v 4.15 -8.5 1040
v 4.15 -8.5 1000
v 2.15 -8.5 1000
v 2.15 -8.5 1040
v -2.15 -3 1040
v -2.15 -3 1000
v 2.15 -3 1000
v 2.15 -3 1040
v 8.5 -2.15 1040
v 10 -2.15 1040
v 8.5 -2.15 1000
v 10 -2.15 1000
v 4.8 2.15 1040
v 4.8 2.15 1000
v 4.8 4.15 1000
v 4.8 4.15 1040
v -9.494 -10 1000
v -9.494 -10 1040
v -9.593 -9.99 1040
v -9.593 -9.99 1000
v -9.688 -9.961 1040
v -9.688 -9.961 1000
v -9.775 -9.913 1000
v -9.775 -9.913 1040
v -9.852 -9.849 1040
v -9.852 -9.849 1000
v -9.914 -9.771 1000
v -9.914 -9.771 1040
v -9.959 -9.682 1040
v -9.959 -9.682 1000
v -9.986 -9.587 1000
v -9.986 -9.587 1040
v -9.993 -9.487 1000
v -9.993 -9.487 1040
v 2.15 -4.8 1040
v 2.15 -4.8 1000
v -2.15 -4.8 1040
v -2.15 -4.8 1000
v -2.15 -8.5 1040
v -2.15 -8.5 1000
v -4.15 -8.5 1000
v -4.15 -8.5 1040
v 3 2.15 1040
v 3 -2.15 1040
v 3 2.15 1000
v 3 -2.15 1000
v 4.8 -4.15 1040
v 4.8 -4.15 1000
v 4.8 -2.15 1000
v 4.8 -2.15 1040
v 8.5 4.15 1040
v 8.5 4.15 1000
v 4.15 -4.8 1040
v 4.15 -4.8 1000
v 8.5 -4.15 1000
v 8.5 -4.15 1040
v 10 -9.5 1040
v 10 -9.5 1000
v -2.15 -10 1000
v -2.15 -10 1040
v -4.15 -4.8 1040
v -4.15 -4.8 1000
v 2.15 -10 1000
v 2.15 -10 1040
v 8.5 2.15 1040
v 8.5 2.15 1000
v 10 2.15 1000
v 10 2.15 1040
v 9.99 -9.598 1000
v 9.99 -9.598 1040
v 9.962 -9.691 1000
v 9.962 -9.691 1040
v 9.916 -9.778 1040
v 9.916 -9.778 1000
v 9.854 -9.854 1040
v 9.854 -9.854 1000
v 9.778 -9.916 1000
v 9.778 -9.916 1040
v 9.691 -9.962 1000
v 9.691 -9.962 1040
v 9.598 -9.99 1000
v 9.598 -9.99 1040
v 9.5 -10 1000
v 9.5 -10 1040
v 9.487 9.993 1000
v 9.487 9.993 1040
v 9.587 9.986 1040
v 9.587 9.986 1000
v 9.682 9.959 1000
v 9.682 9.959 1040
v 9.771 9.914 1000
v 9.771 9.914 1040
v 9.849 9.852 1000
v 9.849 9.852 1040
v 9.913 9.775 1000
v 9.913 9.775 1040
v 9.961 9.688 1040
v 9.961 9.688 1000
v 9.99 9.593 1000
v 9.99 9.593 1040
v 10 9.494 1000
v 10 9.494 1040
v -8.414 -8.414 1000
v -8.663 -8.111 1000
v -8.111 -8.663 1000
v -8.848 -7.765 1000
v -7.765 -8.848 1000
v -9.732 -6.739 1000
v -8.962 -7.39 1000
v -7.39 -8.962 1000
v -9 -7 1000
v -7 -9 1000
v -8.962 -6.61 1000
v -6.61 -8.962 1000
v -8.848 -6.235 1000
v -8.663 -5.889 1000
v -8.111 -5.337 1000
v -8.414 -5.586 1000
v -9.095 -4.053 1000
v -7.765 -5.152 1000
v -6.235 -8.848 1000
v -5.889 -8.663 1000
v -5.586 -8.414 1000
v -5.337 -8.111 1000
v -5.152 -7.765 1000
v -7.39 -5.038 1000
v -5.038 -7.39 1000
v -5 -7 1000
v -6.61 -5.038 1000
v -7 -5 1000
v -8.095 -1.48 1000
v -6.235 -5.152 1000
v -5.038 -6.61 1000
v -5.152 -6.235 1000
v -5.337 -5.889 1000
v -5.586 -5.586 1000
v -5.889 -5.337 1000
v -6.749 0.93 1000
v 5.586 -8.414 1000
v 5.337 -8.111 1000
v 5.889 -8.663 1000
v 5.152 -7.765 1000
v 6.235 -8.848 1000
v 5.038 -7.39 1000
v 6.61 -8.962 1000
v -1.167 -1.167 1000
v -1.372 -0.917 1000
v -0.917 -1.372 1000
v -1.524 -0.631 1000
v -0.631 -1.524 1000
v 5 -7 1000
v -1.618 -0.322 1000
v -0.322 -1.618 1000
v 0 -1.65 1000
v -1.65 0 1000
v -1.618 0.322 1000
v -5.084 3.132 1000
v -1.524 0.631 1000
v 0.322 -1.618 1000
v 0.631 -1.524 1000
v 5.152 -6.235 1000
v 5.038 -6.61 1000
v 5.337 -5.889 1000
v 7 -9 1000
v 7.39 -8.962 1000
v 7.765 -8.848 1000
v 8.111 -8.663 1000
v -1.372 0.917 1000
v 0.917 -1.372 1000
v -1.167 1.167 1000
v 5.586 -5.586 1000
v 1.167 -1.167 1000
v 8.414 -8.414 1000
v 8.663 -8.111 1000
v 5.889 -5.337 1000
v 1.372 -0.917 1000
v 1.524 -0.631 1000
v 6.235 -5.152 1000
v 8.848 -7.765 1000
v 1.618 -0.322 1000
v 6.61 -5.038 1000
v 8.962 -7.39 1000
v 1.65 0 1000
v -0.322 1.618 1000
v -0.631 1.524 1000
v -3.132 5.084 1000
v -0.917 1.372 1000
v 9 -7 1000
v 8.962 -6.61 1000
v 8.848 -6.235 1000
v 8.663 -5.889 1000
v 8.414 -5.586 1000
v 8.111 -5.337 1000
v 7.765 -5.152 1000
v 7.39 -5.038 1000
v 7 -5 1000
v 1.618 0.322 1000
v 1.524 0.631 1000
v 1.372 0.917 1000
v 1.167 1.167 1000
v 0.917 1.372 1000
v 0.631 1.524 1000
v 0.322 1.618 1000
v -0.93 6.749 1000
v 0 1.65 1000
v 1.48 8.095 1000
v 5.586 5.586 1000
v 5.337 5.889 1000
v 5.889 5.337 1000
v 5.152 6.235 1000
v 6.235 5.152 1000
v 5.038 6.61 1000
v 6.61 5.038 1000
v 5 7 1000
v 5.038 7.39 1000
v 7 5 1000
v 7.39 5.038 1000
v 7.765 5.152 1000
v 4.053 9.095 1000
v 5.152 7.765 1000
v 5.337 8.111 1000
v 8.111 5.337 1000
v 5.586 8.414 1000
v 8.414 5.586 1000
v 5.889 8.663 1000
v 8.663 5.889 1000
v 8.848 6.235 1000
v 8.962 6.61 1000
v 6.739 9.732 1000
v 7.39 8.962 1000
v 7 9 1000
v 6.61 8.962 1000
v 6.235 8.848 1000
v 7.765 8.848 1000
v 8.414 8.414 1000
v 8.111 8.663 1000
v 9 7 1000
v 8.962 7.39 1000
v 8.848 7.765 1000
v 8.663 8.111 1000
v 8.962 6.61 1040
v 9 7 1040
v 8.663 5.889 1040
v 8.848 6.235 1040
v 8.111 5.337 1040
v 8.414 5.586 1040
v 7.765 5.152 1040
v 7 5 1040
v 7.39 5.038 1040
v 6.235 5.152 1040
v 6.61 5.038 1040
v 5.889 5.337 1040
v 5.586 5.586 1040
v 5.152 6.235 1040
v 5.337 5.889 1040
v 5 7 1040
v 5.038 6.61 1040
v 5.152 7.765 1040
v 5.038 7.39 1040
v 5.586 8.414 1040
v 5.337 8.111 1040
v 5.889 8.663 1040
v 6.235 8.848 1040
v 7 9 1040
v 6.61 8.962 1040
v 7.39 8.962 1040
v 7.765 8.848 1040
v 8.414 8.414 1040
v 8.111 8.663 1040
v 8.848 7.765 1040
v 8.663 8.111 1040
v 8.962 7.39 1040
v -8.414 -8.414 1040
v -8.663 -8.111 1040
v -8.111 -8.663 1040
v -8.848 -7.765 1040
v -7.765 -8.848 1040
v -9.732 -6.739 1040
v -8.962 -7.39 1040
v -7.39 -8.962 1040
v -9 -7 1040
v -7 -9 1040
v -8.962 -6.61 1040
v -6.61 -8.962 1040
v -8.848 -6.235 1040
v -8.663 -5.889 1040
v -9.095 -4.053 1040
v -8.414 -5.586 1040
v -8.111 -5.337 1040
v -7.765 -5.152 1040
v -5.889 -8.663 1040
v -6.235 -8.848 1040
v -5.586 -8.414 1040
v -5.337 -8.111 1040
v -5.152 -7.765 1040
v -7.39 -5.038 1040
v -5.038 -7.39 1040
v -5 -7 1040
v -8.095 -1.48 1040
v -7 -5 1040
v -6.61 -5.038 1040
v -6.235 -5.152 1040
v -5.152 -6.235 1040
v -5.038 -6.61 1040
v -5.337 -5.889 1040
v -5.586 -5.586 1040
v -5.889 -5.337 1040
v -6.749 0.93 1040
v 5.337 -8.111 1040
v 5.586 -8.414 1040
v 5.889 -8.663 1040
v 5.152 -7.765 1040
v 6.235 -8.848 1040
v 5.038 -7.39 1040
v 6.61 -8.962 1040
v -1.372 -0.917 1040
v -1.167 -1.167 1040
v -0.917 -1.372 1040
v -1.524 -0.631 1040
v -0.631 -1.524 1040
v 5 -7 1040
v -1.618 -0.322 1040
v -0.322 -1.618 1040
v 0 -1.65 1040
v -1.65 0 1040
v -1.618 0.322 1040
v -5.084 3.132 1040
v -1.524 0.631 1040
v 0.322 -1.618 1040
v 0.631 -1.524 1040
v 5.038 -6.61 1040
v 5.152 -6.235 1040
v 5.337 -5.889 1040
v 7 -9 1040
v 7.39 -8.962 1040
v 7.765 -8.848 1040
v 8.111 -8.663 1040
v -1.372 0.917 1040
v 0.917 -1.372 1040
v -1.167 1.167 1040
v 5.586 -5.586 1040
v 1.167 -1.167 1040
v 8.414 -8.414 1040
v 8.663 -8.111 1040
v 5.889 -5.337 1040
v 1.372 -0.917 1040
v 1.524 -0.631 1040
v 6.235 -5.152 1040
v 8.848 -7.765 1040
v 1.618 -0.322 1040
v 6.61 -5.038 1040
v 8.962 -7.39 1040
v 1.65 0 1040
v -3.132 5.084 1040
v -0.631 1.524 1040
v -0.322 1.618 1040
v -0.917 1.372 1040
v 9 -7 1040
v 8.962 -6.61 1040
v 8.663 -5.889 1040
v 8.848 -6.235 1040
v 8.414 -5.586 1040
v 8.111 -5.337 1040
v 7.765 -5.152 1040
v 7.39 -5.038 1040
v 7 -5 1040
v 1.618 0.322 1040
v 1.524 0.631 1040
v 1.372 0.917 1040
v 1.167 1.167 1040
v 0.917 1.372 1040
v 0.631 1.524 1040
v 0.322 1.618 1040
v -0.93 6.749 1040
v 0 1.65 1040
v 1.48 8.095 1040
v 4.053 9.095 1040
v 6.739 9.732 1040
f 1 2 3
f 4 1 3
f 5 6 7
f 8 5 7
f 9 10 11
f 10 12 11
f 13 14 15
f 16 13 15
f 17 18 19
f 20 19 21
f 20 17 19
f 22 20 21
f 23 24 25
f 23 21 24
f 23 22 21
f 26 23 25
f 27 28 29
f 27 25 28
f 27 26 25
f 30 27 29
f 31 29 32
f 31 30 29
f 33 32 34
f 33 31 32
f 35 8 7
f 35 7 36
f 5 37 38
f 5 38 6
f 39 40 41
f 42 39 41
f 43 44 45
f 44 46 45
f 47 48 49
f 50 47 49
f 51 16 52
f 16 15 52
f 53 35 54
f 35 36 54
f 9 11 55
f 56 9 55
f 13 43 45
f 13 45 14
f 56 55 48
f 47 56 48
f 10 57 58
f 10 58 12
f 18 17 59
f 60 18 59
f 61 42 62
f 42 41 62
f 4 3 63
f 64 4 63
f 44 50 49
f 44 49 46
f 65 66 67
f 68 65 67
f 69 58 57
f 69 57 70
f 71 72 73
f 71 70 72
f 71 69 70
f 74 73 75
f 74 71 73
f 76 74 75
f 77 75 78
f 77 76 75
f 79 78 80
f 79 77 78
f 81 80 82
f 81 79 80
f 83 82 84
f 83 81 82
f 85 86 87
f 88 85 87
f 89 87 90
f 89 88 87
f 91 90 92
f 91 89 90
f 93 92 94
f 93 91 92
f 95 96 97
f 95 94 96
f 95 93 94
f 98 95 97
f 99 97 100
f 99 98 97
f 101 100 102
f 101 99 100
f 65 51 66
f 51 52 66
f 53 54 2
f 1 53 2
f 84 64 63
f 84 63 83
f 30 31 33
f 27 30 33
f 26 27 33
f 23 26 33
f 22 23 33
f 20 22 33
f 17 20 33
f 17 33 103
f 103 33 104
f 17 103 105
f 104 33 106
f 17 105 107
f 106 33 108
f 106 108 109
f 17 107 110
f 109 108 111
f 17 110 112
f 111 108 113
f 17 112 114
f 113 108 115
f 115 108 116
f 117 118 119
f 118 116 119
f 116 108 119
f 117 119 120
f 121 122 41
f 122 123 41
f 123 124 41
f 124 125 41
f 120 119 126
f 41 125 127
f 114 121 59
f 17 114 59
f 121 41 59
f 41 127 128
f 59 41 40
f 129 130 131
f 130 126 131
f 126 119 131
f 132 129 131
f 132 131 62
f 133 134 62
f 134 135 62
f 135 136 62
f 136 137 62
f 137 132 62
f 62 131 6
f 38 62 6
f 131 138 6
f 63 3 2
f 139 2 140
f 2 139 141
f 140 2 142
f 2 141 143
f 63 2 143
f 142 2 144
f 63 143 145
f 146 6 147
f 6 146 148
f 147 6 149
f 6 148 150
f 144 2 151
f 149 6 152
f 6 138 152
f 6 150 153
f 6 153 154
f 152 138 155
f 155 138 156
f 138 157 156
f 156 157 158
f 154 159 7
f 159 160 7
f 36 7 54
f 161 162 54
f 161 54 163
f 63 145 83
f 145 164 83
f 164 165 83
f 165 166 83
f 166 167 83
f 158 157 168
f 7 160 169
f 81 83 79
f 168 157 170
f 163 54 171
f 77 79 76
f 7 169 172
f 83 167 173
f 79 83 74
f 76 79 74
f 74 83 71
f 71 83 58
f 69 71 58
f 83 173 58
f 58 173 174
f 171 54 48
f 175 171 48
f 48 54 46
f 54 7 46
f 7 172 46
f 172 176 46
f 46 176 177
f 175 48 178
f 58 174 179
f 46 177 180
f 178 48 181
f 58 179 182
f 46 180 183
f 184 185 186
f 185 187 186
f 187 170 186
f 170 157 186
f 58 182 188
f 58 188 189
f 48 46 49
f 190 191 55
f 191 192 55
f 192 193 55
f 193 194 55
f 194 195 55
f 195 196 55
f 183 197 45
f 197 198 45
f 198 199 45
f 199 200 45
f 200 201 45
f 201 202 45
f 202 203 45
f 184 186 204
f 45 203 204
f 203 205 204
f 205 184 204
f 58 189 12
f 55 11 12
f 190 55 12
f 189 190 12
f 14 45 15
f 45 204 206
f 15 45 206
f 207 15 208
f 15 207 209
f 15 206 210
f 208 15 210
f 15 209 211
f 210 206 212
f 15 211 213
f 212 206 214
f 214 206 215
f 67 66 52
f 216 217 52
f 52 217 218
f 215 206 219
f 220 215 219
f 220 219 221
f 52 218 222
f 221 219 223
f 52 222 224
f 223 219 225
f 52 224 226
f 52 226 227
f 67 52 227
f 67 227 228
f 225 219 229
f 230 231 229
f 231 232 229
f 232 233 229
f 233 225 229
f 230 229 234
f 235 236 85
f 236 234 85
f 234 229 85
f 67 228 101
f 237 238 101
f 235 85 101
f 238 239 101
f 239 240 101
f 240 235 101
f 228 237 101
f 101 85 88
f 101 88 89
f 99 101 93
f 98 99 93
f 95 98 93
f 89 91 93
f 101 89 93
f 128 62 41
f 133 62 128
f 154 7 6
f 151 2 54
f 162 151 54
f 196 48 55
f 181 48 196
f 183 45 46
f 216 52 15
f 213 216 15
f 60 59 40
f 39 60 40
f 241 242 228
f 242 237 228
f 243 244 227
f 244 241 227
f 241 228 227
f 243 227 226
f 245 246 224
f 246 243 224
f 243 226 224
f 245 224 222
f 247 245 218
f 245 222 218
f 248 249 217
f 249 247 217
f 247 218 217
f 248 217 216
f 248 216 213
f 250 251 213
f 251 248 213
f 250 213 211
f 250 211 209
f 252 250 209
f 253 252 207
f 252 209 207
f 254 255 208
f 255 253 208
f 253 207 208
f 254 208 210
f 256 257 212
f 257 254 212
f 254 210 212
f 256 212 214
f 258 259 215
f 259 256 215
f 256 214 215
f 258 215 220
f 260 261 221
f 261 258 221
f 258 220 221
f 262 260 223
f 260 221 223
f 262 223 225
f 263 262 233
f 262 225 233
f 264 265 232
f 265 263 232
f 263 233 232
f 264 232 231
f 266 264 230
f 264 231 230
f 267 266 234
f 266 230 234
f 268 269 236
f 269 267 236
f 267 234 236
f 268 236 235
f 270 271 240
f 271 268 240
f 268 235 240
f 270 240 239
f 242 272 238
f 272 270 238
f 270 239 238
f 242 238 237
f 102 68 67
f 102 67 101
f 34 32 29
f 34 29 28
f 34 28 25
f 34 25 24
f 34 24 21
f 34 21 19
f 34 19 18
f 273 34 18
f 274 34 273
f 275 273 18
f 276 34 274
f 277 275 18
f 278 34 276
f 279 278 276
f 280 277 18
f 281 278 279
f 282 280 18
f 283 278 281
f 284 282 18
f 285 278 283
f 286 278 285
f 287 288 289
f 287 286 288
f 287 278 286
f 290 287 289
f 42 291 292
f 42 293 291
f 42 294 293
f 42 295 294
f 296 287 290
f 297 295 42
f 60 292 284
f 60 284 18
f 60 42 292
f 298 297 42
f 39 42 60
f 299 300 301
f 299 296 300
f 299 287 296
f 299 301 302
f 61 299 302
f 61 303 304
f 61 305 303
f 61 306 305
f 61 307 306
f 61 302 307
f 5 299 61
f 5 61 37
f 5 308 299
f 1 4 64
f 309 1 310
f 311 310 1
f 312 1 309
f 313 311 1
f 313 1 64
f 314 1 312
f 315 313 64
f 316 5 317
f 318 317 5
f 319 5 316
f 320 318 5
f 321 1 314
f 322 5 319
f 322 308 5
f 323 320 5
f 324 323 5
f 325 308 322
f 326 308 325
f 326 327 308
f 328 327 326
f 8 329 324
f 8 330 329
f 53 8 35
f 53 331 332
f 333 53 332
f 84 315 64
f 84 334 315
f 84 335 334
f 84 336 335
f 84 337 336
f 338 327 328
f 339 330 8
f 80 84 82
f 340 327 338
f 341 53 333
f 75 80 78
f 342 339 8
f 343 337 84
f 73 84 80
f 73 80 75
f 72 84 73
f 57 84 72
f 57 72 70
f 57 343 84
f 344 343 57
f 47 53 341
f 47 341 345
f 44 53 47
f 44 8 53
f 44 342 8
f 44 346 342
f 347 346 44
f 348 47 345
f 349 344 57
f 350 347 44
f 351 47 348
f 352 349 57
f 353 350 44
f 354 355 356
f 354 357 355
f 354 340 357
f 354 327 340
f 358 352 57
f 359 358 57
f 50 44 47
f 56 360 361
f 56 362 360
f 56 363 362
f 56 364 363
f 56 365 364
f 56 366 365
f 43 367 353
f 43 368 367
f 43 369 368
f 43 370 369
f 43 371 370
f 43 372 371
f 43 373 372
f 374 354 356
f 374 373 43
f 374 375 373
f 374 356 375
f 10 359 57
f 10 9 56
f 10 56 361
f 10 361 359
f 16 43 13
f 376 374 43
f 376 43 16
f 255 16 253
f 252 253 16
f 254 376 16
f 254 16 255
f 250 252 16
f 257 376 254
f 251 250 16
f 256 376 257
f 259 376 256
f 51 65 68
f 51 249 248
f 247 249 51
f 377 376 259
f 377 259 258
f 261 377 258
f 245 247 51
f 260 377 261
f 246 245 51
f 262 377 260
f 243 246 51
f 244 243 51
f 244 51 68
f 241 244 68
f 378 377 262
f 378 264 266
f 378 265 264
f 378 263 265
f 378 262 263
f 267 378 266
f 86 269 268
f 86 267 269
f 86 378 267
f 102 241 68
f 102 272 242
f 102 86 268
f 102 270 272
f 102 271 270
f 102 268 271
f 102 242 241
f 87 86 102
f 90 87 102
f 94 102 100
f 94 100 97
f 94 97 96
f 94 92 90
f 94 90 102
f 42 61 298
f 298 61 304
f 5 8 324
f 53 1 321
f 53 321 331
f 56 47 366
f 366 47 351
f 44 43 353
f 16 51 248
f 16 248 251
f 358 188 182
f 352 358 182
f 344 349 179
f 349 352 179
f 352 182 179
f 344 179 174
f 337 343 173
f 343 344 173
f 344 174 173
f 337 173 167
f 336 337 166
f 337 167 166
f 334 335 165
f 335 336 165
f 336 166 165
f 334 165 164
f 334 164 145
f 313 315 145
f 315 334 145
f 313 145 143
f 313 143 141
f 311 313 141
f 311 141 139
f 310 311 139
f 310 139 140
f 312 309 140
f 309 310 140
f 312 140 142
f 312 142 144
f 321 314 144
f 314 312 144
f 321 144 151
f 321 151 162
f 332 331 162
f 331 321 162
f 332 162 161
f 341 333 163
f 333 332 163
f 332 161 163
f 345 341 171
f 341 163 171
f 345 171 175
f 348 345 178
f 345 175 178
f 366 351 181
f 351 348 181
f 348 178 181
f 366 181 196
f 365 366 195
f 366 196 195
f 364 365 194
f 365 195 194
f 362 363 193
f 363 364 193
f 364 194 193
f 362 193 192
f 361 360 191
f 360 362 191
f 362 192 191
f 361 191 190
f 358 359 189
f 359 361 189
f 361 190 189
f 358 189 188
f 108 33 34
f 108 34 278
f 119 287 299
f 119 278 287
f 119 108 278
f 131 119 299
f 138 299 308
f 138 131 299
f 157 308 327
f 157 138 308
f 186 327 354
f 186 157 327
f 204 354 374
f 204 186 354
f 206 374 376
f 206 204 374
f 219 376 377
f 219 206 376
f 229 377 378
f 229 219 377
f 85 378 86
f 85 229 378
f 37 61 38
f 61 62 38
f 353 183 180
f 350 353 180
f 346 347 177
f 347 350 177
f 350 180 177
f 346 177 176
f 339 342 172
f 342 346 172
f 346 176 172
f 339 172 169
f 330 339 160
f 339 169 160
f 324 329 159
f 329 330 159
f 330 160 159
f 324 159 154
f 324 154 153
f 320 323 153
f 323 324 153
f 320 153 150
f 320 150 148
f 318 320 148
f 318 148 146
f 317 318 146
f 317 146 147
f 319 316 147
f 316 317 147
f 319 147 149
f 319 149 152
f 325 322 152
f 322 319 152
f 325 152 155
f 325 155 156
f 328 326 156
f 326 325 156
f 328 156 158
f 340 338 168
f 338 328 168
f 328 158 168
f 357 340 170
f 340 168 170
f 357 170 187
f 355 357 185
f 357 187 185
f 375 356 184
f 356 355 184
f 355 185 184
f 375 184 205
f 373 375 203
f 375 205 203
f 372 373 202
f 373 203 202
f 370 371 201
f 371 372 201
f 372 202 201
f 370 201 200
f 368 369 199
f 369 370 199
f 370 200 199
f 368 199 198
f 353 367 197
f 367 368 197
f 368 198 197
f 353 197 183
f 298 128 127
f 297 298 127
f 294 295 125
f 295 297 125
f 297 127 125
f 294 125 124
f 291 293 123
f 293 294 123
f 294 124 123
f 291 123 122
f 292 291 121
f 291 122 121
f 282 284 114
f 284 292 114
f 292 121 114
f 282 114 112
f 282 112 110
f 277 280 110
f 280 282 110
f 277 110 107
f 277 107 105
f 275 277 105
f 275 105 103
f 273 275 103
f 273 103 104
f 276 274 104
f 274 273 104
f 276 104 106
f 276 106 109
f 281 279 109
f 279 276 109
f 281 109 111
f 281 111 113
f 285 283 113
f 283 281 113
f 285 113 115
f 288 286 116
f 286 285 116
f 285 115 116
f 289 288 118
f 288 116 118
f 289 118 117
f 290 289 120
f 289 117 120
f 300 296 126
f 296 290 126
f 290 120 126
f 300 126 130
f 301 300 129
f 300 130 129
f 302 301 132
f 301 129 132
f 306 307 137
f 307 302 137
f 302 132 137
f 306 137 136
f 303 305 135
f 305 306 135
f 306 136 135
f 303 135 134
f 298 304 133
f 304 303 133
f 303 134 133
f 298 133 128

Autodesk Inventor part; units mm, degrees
ref_plane "YZ Plane" through (0, 0, 0) normal (1, 0, 0) x (0, 1, 0)
ref_plane "XZ Plane" through (0, 0, 0) normal (0, 1, 0) x (-1, 0, 0)
ref_plane "作業平面1" through (2.15, -10, 1000) normal (0, 0, 1) x (1, 0, 0)
sketch "スケッチ1" plane through (2.15, -10, 1000) normal (0, 0, 1) x (1, 0, 0)
  line L0 (6.35, 12.15) -> (7.85, 12.15) projected
  line L1 (7.85, 12.15) -> (7.85, 19.4936) projected
  arc A0 (7.85, 19.4936) -> (7.3372, 19.9934) centre (7.35, 19.4936) ccw projected
  arc A1 (7.3372, 19.9934) -> (-12.1434, 0.5128) centre (7.85, 0) ccw projected
  arc A2 (-12.1434, 0.5128) -> (-11.6436, 0) centre (-11.6436, 0.5) ccw projected
  line L2 (-11.6436, 0) -> (-4.3, 0) projected
  line L3 (-4.3, 0) -> (-4.3, 1.5) projected
  line L4 (-4.3, 1.5) -> (-6.3, 1.5) projected
  line L5 (-6.3, 1.5) -> (-6.3, 5.2) projected
  line L6 (-6.3, 5.2) -> (-4.3, 5.2) projected
  line L7 (-4.3, 5.2) -> (-4.3, 7) projected
  line L8 (-4.3, 7) -> (0, 7) projected
  line L9 (0, 7) -> (0, 5.2) projected
  line L10 (0, 5.2) -> (2, 5.2) projected
  line L11 (2, 5.2) -> (2, 1.5) projected
  line L12 (2, 1.5) -> (0, 1.5) projected
  line L13 (0, 1.5) -> (0, 0) projected
  line L14 (0, 0) -> (7.35, 0) projected
  arc A3 (7.35, 0) -> (7.85, 0.5) centre (7.35, 0.5) ccw projected
  line L15 (7.85, 0.5) -> (7.85, 7.85) projected
  line L16 (7.85, 7.85) -> (6.35, 7.85) projected
  line L17 (6.35, 7.85) -> (6.35, 5.85) projected
  line L18 (6.35, 5.85) -> (2.65, 5.85) projected
  line L19 (2.65, 5.85) -> (2.65, 7.85) projected
  line L20 (2.65, 7.85) -> (0.85, 7.85) projected
  line L21 (0.85, 7.85) -> (0.85, 12.15) projected
  line L22 (0.85, 12.15) -> (2.65, 12.15) projected
  line L23 (2.65, 12.15) -> (2.65, 14.15) projected
  line L24 (2.65, 14.15) -> (6.35, 14.15) projected
  line L25 (6.35, 14.15) -> (6.35, 12.15) projected
  circle A4 centre (4.85, 3) radius 2 projected
  circle A5 centre (-9.15, 3) radius 2 projected
  circle A6 centre (4.85, 17) radius 2 projected
  circle A7 centre (-2.15, 10) radius 1.65 projected
extrude "押し出し1" add sketch "スケッチ1" along normal blind 40
properties part number "AFSR-2020-4-1000"
